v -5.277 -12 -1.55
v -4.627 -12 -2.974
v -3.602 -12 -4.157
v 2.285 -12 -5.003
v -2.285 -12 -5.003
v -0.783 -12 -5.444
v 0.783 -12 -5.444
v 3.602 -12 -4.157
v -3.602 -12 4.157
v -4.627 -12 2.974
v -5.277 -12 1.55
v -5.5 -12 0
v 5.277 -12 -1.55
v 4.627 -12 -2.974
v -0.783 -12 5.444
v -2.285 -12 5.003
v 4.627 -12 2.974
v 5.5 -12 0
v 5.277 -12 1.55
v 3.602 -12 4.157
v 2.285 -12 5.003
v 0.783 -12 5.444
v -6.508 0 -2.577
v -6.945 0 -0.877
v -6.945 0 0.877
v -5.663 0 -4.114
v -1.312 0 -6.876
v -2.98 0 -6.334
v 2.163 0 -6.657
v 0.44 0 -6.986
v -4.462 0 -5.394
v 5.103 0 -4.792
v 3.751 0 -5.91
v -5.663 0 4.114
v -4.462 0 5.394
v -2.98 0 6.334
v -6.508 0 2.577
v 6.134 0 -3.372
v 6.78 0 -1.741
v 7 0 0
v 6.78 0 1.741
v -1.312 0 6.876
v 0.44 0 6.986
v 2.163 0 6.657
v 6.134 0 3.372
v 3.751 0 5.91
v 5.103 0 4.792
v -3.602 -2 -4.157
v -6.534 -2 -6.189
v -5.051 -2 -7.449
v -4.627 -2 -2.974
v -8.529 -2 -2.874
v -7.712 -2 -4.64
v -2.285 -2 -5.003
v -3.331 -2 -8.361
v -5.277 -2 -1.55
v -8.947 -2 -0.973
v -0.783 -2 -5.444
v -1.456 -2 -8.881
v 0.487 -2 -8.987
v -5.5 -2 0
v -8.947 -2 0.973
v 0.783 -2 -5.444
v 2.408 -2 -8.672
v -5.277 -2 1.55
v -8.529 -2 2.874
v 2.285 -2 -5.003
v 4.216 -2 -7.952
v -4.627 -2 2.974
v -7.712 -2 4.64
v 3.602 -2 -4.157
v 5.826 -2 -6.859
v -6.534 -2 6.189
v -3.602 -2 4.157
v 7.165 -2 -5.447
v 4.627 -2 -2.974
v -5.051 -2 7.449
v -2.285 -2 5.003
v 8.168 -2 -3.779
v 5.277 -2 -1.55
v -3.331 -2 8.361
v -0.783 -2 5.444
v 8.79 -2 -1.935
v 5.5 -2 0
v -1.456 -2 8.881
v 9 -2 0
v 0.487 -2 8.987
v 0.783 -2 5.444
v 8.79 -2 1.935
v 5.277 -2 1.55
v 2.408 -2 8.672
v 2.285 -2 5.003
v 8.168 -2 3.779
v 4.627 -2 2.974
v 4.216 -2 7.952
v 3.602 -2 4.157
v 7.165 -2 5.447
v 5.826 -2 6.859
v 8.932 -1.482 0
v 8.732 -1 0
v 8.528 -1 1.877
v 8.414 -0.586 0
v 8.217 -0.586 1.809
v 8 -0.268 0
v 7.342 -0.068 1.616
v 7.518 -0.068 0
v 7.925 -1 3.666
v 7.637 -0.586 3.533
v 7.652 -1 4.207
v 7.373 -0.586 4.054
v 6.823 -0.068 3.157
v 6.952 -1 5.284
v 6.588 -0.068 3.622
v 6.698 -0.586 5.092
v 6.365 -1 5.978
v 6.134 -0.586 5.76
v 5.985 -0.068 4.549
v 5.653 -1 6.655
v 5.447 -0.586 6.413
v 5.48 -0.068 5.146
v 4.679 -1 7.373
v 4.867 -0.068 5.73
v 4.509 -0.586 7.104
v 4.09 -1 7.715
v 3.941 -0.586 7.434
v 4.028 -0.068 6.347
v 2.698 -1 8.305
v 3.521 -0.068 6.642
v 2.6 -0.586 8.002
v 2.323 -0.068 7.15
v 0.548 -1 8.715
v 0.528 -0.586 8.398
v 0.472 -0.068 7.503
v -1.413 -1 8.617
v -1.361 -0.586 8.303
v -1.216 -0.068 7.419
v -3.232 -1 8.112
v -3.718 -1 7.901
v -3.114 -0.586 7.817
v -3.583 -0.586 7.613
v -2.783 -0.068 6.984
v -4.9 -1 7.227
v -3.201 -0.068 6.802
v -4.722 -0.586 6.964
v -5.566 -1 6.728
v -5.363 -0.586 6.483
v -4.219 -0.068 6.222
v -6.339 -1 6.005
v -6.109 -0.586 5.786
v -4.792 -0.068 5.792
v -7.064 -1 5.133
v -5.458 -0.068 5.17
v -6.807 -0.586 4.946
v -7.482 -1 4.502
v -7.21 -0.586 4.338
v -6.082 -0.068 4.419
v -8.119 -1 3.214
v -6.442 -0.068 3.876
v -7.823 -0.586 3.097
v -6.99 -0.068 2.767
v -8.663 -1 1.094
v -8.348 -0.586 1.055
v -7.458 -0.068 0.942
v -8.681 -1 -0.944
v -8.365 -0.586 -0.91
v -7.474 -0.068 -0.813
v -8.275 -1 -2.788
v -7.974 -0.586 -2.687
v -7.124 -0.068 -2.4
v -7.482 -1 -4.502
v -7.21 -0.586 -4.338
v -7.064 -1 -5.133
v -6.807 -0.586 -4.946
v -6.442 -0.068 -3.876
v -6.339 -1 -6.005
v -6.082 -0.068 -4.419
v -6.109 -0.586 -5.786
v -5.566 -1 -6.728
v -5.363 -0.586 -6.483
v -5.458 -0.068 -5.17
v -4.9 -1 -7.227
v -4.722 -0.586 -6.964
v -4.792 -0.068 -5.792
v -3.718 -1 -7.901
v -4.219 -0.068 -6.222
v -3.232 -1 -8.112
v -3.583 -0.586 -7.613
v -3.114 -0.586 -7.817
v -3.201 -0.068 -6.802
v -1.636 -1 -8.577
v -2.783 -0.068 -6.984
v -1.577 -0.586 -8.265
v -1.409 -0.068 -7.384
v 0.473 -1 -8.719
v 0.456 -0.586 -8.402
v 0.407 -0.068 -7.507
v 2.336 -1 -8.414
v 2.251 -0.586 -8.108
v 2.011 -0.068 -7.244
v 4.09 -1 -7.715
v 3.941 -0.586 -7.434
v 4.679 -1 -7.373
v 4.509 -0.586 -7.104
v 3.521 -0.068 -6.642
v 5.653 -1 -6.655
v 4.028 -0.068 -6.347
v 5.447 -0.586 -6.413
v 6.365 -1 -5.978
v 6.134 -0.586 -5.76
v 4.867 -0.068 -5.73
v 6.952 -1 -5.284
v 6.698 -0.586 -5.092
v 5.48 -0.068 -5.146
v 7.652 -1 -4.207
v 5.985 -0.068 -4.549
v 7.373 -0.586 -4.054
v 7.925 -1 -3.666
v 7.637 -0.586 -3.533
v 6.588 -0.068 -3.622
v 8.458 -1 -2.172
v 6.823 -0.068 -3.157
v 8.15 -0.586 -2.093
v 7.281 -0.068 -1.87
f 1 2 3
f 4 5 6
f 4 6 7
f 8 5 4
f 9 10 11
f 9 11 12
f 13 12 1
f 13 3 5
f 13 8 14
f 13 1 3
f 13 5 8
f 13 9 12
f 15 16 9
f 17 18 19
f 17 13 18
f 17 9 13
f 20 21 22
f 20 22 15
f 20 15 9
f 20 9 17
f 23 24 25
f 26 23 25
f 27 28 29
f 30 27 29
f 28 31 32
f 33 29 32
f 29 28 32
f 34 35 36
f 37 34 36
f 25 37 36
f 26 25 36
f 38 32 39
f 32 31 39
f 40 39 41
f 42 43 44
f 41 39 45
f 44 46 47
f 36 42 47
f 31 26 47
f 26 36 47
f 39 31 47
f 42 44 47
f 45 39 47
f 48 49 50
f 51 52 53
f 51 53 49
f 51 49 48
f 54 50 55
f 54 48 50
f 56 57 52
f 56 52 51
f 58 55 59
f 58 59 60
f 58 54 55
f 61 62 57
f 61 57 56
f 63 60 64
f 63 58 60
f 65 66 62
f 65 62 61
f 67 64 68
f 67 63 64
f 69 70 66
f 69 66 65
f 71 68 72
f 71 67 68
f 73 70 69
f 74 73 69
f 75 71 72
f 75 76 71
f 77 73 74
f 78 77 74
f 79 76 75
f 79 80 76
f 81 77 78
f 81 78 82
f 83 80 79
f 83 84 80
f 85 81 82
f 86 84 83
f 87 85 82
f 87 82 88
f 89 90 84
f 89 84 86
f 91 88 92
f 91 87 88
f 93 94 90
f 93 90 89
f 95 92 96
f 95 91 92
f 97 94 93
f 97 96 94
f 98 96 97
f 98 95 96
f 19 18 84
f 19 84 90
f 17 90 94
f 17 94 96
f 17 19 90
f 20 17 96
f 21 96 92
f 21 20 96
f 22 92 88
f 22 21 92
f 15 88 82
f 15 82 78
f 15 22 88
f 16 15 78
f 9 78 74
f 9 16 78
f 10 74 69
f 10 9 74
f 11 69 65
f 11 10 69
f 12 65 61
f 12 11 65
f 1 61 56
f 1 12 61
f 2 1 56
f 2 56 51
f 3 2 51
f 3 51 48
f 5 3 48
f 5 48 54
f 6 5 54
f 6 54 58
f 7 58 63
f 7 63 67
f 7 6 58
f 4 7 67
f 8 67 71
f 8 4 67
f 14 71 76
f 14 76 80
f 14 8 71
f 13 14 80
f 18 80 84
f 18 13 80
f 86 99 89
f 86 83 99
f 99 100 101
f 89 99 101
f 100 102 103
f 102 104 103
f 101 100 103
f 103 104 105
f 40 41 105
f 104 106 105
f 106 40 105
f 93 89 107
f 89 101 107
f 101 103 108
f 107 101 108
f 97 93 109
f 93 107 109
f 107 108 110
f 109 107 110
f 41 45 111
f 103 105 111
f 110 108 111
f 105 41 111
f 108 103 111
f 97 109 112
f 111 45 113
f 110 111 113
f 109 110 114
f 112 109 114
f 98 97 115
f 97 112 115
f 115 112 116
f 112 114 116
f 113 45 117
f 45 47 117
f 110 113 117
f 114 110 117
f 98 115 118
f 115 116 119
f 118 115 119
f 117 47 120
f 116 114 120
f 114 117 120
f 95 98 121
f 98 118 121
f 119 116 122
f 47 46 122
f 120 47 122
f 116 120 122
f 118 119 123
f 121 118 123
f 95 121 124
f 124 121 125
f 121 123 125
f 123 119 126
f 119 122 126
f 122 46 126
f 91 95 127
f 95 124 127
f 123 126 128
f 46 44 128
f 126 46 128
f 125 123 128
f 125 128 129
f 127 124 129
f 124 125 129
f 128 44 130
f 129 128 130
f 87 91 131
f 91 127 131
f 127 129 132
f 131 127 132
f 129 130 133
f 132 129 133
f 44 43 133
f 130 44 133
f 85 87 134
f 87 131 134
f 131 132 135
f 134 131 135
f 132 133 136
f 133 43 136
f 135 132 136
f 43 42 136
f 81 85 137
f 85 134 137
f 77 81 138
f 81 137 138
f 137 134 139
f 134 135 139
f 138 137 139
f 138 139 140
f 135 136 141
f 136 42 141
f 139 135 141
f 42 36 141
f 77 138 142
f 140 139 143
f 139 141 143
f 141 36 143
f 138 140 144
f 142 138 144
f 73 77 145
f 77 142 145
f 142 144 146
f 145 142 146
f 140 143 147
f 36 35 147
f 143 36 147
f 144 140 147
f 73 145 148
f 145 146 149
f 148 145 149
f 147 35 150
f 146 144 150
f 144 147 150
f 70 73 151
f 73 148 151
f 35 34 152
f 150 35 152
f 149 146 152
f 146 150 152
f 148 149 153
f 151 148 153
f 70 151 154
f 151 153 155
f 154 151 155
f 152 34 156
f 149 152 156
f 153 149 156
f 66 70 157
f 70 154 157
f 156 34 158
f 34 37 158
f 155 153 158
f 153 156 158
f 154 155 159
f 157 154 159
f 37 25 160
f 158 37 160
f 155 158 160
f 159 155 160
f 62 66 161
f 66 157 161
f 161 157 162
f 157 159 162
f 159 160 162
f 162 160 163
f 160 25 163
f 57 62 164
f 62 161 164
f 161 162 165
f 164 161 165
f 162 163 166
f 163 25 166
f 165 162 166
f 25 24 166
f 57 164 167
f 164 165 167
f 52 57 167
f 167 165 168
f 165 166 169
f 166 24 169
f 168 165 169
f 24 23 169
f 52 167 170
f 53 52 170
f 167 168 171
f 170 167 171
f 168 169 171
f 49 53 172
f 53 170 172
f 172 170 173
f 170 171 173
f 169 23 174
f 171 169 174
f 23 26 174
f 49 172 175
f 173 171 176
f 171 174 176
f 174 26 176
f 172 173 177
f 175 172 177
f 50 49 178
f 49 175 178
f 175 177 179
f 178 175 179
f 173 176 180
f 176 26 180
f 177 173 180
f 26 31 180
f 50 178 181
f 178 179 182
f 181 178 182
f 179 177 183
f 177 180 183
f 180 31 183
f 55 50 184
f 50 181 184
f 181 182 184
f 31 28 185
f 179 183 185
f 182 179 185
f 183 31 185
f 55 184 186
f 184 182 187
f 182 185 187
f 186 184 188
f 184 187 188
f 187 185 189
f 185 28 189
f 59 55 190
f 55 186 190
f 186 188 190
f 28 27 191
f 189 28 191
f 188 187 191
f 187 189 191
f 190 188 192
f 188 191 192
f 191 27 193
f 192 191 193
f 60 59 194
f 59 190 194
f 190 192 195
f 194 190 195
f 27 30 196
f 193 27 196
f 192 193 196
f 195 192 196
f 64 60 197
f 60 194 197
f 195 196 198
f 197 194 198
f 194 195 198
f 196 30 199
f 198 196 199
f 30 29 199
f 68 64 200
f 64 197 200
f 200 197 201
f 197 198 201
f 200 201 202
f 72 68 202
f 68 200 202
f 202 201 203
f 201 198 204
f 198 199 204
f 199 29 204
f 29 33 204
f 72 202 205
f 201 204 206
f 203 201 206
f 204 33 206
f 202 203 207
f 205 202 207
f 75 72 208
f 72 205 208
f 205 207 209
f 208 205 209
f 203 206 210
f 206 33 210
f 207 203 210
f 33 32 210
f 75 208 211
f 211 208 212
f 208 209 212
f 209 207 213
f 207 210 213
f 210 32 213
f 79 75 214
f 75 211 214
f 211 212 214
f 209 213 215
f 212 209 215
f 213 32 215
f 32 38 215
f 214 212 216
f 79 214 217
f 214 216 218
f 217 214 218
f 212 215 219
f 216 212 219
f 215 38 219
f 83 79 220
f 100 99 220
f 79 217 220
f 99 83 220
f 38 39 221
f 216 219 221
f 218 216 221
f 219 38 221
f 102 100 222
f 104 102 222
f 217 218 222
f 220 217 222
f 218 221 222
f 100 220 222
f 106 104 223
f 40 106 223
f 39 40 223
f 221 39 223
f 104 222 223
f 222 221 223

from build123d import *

# Parameters (mm, degrees)
F0_R     = 9
F1_DEPTH = 12
F3_R     = 2
F2_R     = 9
F2_R_2   = 5.5
F4_DEPTH = 10


with BuildPart() as f1:
    # F0 (on Front) → F1 (new body)
    with BuildSketch(Plane.XZ):
        Circle(F0_R)
    extrude(amount=F1_DEPTH)

    # F3
    f3_edges = [f1.edges().sort_by_distance(p)[0] for p in [
        (-9, 0, 0),
    ]]
    fillet(f3_edges, radius=F3_R)

    # F2 (on face) → F4 (cut)
    with BuildSketch(Plane.XZ.offset(12)):
        Circle(F2_R)
        Circle(F2_R_2, mode=Mode.SUBTRACT)
    extrude(amount=-F4_DEPTH, mode=Mode.SUBTRACT)


solid = f1.part
